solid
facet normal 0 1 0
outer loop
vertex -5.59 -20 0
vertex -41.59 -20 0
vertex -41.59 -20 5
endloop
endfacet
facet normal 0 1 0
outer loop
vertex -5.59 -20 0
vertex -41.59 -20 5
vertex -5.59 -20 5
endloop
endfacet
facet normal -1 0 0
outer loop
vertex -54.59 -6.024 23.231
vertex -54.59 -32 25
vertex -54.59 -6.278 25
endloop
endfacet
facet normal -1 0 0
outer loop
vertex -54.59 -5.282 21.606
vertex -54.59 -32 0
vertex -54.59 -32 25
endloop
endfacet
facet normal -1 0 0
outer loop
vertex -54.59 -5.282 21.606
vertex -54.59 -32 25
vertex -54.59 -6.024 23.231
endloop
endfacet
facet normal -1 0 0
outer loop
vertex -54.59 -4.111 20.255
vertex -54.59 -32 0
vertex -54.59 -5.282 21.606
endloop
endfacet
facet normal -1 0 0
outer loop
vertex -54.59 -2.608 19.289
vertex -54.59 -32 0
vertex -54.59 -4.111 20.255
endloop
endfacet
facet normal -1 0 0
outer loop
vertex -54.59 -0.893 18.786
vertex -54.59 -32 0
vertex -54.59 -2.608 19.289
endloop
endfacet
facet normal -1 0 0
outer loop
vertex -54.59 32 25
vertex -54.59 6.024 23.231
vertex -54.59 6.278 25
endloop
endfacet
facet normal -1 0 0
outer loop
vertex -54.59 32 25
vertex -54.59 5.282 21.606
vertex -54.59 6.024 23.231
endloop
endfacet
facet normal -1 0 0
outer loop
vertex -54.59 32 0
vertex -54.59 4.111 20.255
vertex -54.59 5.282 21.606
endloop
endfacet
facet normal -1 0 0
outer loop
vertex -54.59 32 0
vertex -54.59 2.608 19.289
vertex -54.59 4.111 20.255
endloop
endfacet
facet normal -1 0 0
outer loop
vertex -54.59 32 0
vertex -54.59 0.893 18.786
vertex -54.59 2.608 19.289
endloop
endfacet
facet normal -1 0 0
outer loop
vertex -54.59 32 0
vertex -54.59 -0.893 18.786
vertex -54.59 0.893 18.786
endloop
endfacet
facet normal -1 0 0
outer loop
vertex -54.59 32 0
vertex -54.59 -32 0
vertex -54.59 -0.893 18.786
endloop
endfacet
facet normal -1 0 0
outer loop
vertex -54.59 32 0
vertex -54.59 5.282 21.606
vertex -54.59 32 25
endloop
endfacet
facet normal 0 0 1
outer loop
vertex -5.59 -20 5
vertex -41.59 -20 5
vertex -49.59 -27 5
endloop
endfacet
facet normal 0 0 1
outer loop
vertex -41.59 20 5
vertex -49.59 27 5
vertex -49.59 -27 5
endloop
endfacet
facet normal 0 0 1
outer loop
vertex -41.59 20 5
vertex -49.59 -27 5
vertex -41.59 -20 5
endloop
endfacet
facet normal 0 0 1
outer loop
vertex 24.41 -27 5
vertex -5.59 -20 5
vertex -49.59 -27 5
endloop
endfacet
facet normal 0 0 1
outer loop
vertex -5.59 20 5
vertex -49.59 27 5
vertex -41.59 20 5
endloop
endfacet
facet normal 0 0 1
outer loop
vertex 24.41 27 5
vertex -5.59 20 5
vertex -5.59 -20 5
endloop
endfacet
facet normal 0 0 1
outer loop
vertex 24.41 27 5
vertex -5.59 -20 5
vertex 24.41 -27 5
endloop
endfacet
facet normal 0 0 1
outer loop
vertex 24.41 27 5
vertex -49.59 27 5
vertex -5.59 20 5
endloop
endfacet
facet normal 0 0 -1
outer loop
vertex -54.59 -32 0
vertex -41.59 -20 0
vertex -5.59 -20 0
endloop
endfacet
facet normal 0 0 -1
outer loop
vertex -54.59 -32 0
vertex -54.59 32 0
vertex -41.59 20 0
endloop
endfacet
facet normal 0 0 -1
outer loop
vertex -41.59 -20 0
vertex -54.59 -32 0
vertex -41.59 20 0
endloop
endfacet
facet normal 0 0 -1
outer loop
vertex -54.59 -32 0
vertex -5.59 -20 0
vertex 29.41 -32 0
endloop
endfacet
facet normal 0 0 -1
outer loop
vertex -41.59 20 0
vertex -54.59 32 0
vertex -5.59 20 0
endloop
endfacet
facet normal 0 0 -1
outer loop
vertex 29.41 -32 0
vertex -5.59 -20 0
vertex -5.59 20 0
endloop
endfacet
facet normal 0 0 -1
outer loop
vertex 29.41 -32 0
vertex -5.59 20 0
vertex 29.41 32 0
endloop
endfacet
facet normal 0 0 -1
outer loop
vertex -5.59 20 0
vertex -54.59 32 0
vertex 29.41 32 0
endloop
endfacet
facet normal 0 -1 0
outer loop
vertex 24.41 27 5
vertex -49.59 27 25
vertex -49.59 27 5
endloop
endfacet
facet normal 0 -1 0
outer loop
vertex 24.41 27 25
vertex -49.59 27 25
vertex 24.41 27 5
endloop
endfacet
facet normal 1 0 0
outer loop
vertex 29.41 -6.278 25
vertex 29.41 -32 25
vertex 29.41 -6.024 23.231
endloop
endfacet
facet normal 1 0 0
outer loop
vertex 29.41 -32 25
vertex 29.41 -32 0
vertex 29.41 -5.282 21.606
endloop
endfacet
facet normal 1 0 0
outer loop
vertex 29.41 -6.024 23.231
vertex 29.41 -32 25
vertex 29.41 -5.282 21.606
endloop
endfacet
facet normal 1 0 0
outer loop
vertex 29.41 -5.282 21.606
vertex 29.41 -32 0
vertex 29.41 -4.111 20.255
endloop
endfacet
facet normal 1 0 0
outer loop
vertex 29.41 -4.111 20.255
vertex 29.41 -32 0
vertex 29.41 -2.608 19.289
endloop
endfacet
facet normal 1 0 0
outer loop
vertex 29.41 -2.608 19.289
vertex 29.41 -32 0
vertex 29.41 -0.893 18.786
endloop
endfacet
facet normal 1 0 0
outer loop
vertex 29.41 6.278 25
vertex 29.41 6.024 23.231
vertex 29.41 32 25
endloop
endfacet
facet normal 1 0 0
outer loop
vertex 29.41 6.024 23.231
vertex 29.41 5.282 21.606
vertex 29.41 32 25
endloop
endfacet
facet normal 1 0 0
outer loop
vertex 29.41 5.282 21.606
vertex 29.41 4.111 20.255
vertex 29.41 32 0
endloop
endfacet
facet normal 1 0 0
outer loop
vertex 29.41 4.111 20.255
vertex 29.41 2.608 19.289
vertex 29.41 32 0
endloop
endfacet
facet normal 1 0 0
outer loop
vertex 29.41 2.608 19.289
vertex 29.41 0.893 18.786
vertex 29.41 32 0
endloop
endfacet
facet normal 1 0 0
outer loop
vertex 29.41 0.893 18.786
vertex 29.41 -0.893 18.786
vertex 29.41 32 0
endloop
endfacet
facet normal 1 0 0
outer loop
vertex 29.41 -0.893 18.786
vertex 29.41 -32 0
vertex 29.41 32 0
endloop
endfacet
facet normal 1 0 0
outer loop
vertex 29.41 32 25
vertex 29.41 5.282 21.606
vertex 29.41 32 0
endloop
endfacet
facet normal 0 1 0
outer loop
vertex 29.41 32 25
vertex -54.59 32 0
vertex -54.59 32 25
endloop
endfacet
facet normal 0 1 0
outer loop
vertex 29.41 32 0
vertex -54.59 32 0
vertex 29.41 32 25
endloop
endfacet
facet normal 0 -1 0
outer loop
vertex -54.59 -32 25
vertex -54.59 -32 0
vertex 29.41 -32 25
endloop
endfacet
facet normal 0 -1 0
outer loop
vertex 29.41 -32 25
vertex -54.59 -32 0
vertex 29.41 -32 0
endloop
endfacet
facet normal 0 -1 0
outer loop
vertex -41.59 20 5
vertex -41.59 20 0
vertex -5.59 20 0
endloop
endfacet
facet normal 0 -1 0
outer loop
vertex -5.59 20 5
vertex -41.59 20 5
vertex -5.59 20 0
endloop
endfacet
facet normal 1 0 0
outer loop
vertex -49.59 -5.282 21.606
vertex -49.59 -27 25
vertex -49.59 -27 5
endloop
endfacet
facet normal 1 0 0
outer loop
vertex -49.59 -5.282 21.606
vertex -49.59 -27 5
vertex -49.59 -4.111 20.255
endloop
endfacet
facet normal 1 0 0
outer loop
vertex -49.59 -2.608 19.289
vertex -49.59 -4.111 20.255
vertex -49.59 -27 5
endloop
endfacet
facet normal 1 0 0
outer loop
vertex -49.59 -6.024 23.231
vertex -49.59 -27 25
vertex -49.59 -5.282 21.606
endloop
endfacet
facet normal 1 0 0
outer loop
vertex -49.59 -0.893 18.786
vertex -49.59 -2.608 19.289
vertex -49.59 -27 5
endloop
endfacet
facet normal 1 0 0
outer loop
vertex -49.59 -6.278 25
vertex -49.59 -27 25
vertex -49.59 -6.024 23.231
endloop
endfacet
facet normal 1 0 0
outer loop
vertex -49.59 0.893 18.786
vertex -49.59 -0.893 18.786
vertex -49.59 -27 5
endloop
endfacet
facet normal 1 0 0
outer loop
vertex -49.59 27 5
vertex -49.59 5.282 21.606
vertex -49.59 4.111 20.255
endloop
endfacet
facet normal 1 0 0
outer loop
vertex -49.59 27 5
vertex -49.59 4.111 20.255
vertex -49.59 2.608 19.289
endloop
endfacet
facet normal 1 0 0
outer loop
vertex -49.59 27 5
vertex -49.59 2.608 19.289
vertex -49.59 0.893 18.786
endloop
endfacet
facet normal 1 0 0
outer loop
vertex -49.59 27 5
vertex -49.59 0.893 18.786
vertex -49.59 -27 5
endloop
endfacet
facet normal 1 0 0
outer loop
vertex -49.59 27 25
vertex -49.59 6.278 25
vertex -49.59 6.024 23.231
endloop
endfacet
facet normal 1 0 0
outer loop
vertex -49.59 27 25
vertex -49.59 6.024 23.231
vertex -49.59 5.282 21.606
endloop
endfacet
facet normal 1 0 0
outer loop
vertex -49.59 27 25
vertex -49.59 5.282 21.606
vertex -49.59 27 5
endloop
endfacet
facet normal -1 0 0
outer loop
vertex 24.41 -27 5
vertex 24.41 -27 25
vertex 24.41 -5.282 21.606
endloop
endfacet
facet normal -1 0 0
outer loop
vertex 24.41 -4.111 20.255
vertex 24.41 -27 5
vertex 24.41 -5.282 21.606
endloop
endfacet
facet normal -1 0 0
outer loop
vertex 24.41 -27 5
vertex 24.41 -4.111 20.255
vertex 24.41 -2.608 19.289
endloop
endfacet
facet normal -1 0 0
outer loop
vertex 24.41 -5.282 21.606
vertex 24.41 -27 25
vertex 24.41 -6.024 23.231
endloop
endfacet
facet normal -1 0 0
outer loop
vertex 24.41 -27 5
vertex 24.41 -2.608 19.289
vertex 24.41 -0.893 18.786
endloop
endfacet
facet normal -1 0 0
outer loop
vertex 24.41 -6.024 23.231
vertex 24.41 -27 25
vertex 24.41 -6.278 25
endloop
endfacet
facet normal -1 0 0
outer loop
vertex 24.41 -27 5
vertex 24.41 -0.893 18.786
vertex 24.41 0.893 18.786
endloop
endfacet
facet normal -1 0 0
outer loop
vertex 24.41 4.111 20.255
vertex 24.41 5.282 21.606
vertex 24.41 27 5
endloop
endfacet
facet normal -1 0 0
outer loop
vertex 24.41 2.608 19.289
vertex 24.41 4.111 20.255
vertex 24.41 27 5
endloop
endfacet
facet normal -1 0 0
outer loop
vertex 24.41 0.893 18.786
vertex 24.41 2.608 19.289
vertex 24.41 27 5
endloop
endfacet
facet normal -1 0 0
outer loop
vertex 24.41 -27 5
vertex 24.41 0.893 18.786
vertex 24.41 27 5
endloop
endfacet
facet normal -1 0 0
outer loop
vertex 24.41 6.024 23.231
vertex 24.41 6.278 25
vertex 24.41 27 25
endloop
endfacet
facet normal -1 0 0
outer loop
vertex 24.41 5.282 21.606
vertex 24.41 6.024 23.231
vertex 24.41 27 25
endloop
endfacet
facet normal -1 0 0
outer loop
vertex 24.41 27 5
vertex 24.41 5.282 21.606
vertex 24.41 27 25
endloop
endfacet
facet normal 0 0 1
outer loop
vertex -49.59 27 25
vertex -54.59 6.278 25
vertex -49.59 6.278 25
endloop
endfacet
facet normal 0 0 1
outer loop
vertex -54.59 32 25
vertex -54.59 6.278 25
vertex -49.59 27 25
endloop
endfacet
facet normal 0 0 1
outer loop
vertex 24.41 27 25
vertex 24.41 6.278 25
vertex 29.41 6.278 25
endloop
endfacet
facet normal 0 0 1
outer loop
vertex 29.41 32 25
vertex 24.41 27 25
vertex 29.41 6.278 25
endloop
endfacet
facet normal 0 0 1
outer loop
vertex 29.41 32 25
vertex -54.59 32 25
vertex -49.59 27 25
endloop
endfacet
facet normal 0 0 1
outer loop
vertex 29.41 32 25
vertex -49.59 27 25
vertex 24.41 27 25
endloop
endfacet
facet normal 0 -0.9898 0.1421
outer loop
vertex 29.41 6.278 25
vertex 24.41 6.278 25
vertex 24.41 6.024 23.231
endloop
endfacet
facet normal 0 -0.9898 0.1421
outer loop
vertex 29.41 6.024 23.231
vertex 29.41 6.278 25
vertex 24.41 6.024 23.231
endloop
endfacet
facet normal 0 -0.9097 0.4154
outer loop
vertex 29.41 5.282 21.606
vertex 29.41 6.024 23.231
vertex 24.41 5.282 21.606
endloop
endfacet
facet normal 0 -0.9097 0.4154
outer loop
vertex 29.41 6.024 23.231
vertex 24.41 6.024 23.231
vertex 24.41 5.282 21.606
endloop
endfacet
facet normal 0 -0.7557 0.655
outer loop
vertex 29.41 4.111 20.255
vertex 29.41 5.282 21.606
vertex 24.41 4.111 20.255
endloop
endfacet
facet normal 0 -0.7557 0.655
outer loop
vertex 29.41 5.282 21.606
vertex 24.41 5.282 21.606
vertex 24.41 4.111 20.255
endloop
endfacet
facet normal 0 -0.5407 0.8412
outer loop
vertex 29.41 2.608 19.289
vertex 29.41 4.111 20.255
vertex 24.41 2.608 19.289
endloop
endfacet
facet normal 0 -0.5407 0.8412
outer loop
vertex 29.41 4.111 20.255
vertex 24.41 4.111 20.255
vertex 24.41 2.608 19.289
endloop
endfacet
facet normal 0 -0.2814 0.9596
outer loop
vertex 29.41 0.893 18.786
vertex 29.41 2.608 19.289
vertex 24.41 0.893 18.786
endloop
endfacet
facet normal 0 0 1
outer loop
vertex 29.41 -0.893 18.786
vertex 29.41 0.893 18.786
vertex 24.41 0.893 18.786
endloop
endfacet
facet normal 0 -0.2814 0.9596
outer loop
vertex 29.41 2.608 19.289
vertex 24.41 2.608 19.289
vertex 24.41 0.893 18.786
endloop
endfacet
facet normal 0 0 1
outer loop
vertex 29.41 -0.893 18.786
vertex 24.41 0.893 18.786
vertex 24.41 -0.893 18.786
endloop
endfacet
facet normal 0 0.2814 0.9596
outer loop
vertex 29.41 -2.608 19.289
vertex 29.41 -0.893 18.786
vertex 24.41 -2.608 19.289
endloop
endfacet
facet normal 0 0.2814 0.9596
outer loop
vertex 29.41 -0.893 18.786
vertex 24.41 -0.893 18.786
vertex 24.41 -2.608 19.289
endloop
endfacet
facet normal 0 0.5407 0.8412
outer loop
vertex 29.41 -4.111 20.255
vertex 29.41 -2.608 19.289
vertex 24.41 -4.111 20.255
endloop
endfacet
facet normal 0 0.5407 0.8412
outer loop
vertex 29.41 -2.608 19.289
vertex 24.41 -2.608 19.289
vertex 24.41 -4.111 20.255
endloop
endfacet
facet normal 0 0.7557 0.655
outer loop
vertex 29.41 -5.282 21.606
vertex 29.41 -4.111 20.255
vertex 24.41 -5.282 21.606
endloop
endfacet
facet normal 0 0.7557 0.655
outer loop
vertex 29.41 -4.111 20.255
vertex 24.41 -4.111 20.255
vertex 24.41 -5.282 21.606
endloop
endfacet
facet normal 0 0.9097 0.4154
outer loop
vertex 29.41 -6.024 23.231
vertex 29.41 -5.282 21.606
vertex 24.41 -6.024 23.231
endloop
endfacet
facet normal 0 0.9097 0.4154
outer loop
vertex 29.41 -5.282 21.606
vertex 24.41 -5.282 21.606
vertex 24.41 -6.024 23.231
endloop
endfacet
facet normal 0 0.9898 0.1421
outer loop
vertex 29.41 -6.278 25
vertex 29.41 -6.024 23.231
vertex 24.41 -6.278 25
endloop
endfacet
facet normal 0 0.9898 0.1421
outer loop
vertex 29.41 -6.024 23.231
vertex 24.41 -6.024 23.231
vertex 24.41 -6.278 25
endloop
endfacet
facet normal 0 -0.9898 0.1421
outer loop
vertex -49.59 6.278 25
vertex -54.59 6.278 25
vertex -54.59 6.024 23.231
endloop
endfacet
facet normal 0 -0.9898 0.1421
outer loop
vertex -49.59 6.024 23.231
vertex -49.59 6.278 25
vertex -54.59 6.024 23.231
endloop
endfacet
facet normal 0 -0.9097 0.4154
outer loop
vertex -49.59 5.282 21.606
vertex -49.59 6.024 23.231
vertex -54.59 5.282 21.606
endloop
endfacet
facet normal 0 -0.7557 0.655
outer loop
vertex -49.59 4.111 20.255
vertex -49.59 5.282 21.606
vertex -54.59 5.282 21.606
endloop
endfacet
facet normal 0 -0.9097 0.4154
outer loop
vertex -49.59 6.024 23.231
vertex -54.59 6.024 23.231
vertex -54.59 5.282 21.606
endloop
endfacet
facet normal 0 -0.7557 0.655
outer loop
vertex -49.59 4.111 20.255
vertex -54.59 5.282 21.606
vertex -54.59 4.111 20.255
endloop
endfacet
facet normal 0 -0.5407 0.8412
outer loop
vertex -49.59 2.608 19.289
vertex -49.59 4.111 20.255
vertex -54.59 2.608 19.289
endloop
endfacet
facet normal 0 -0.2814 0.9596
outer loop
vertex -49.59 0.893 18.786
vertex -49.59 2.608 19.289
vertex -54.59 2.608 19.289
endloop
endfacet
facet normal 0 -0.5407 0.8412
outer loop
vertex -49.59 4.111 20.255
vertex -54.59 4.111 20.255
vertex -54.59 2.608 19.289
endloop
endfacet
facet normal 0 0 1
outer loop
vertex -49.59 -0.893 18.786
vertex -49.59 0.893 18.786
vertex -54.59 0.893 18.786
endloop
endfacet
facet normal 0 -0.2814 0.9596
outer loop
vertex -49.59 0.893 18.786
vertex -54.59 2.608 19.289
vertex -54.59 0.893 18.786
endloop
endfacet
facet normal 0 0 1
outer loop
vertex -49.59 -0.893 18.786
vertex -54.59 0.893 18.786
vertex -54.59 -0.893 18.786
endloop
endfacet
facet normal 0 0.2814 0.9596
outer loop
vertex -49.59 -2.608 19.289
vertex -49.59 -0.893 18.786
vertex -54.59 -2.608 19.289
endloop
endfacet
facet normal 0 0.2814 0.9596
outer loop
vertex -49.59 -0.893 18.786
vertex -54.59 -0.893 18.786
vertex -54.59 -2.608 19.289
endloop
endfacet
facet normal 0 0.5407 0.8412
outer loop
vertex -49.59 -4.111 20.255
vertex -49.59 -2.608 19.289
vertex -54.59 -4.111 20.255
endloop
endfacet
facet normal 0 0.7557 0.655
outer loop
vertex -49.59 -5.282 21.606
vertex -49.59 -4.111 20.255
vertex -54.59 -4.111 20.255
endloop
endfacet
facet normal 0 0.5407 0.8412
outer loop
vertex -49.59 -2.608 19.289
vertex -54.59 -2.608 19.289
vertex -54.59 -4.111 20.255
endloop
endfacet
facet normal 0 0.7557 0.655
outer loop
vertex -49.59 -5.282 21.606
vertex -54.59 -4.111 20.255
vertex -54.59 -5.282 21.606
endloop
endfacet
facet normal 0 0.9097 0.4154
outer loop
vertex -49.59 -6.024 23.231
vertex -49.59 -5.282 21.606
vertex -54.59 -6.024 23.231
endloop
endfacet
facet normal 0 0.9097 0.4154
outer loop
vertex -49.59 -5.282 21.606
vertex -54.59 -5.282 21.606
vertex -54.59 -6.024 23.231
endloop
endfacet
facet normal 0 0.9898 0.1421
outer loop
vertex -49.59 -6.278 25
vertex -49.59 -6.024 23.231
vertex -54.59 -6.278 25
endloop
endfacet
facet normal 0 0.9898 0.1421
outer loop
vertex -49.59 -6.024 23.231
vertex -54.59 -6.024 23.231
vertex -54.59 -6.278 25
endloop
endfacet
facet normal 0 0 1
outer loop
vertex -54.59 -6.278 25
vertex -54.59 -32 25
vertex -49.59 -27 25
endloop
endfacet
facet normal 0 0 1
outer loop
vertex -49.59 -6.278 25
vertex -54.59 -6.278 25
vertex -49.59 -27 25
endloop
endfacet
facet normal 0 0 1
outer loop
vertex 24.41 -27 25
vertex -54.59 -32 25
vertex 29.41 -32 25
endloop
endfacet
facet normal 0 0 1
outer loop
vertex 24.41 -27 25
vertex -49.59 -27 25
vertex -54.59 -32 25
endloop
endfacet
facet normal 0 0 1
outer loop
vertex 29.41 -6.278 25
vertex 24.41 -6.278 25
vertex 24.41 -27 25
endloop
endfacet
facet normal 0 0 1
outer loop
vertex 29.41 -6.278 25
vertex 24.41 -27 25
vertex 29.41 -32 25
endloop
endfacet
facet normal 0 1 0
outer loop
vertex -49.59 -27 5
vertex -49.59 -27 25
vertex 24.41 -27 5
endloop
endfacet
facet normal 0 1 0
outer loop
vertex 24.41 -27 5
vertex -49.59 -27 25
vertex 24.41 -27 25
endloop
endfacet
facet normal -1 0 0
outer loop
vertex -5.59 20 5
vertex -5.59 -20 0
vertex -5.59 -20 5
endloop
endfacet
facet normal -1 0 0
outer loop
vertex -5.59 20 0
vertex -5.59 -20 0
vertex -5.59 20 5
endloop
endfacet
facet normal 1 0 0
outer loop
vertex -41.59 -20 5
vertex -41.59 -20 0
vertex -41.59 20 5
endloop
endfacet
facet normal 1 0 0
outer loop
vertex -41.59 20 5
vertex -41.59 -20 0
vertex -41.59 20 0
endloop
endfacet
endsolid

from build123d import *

# Parameters (mm, degrees)
F0_W     = 83.9999988675
F0_H     = 63.9999988675
F0_W_2   = 36
F0_H_2   = 40
F1_DEPTH = 25
F2_W     = 73.9999988675
F2_H     = 53.9999988675
F3_DEPTH = 20
F4_R     = 6.2782984732
F5_DEPTH = 100


with BuildPart() as f1:
    # F0 (on Top) → F1 (new body)
    with BuildSketch(Plane.XY):
        with Locations((-12.5897452821, 0)):
            Rectangle(F0_W, F0_H)
        with Locations((-23.5897447158, 0)):
            Rectangle(F0_W_2, F0_H_2, mode=Mode.SUBTRACT)
    extrude(amount=F1_DEPTH)

    # F2 (on face) → F3 (cut)
    with BuildSketch(Plane.XY.offset(25)):
        with Locations((-12.5897452821, 0)):
            Rectangle(F2_W, F2_H)
    extrude(amount=-F3_DEPTH, mode=Mode.SUBTRACT)

    # F4 (on face) → F5 (cut)
    with BuildSketch(Plane(origin=(-54.5897447158, 0, 0), x_dir=(0, -1, 0), z_dir=(-1, 0, 0))):
        with Locations((0, 25)):
            Circle(F4_R)
    extrude(amount=-F5_DEPTH, mode=Mode.SUBTRACT)


solid = f1.part
